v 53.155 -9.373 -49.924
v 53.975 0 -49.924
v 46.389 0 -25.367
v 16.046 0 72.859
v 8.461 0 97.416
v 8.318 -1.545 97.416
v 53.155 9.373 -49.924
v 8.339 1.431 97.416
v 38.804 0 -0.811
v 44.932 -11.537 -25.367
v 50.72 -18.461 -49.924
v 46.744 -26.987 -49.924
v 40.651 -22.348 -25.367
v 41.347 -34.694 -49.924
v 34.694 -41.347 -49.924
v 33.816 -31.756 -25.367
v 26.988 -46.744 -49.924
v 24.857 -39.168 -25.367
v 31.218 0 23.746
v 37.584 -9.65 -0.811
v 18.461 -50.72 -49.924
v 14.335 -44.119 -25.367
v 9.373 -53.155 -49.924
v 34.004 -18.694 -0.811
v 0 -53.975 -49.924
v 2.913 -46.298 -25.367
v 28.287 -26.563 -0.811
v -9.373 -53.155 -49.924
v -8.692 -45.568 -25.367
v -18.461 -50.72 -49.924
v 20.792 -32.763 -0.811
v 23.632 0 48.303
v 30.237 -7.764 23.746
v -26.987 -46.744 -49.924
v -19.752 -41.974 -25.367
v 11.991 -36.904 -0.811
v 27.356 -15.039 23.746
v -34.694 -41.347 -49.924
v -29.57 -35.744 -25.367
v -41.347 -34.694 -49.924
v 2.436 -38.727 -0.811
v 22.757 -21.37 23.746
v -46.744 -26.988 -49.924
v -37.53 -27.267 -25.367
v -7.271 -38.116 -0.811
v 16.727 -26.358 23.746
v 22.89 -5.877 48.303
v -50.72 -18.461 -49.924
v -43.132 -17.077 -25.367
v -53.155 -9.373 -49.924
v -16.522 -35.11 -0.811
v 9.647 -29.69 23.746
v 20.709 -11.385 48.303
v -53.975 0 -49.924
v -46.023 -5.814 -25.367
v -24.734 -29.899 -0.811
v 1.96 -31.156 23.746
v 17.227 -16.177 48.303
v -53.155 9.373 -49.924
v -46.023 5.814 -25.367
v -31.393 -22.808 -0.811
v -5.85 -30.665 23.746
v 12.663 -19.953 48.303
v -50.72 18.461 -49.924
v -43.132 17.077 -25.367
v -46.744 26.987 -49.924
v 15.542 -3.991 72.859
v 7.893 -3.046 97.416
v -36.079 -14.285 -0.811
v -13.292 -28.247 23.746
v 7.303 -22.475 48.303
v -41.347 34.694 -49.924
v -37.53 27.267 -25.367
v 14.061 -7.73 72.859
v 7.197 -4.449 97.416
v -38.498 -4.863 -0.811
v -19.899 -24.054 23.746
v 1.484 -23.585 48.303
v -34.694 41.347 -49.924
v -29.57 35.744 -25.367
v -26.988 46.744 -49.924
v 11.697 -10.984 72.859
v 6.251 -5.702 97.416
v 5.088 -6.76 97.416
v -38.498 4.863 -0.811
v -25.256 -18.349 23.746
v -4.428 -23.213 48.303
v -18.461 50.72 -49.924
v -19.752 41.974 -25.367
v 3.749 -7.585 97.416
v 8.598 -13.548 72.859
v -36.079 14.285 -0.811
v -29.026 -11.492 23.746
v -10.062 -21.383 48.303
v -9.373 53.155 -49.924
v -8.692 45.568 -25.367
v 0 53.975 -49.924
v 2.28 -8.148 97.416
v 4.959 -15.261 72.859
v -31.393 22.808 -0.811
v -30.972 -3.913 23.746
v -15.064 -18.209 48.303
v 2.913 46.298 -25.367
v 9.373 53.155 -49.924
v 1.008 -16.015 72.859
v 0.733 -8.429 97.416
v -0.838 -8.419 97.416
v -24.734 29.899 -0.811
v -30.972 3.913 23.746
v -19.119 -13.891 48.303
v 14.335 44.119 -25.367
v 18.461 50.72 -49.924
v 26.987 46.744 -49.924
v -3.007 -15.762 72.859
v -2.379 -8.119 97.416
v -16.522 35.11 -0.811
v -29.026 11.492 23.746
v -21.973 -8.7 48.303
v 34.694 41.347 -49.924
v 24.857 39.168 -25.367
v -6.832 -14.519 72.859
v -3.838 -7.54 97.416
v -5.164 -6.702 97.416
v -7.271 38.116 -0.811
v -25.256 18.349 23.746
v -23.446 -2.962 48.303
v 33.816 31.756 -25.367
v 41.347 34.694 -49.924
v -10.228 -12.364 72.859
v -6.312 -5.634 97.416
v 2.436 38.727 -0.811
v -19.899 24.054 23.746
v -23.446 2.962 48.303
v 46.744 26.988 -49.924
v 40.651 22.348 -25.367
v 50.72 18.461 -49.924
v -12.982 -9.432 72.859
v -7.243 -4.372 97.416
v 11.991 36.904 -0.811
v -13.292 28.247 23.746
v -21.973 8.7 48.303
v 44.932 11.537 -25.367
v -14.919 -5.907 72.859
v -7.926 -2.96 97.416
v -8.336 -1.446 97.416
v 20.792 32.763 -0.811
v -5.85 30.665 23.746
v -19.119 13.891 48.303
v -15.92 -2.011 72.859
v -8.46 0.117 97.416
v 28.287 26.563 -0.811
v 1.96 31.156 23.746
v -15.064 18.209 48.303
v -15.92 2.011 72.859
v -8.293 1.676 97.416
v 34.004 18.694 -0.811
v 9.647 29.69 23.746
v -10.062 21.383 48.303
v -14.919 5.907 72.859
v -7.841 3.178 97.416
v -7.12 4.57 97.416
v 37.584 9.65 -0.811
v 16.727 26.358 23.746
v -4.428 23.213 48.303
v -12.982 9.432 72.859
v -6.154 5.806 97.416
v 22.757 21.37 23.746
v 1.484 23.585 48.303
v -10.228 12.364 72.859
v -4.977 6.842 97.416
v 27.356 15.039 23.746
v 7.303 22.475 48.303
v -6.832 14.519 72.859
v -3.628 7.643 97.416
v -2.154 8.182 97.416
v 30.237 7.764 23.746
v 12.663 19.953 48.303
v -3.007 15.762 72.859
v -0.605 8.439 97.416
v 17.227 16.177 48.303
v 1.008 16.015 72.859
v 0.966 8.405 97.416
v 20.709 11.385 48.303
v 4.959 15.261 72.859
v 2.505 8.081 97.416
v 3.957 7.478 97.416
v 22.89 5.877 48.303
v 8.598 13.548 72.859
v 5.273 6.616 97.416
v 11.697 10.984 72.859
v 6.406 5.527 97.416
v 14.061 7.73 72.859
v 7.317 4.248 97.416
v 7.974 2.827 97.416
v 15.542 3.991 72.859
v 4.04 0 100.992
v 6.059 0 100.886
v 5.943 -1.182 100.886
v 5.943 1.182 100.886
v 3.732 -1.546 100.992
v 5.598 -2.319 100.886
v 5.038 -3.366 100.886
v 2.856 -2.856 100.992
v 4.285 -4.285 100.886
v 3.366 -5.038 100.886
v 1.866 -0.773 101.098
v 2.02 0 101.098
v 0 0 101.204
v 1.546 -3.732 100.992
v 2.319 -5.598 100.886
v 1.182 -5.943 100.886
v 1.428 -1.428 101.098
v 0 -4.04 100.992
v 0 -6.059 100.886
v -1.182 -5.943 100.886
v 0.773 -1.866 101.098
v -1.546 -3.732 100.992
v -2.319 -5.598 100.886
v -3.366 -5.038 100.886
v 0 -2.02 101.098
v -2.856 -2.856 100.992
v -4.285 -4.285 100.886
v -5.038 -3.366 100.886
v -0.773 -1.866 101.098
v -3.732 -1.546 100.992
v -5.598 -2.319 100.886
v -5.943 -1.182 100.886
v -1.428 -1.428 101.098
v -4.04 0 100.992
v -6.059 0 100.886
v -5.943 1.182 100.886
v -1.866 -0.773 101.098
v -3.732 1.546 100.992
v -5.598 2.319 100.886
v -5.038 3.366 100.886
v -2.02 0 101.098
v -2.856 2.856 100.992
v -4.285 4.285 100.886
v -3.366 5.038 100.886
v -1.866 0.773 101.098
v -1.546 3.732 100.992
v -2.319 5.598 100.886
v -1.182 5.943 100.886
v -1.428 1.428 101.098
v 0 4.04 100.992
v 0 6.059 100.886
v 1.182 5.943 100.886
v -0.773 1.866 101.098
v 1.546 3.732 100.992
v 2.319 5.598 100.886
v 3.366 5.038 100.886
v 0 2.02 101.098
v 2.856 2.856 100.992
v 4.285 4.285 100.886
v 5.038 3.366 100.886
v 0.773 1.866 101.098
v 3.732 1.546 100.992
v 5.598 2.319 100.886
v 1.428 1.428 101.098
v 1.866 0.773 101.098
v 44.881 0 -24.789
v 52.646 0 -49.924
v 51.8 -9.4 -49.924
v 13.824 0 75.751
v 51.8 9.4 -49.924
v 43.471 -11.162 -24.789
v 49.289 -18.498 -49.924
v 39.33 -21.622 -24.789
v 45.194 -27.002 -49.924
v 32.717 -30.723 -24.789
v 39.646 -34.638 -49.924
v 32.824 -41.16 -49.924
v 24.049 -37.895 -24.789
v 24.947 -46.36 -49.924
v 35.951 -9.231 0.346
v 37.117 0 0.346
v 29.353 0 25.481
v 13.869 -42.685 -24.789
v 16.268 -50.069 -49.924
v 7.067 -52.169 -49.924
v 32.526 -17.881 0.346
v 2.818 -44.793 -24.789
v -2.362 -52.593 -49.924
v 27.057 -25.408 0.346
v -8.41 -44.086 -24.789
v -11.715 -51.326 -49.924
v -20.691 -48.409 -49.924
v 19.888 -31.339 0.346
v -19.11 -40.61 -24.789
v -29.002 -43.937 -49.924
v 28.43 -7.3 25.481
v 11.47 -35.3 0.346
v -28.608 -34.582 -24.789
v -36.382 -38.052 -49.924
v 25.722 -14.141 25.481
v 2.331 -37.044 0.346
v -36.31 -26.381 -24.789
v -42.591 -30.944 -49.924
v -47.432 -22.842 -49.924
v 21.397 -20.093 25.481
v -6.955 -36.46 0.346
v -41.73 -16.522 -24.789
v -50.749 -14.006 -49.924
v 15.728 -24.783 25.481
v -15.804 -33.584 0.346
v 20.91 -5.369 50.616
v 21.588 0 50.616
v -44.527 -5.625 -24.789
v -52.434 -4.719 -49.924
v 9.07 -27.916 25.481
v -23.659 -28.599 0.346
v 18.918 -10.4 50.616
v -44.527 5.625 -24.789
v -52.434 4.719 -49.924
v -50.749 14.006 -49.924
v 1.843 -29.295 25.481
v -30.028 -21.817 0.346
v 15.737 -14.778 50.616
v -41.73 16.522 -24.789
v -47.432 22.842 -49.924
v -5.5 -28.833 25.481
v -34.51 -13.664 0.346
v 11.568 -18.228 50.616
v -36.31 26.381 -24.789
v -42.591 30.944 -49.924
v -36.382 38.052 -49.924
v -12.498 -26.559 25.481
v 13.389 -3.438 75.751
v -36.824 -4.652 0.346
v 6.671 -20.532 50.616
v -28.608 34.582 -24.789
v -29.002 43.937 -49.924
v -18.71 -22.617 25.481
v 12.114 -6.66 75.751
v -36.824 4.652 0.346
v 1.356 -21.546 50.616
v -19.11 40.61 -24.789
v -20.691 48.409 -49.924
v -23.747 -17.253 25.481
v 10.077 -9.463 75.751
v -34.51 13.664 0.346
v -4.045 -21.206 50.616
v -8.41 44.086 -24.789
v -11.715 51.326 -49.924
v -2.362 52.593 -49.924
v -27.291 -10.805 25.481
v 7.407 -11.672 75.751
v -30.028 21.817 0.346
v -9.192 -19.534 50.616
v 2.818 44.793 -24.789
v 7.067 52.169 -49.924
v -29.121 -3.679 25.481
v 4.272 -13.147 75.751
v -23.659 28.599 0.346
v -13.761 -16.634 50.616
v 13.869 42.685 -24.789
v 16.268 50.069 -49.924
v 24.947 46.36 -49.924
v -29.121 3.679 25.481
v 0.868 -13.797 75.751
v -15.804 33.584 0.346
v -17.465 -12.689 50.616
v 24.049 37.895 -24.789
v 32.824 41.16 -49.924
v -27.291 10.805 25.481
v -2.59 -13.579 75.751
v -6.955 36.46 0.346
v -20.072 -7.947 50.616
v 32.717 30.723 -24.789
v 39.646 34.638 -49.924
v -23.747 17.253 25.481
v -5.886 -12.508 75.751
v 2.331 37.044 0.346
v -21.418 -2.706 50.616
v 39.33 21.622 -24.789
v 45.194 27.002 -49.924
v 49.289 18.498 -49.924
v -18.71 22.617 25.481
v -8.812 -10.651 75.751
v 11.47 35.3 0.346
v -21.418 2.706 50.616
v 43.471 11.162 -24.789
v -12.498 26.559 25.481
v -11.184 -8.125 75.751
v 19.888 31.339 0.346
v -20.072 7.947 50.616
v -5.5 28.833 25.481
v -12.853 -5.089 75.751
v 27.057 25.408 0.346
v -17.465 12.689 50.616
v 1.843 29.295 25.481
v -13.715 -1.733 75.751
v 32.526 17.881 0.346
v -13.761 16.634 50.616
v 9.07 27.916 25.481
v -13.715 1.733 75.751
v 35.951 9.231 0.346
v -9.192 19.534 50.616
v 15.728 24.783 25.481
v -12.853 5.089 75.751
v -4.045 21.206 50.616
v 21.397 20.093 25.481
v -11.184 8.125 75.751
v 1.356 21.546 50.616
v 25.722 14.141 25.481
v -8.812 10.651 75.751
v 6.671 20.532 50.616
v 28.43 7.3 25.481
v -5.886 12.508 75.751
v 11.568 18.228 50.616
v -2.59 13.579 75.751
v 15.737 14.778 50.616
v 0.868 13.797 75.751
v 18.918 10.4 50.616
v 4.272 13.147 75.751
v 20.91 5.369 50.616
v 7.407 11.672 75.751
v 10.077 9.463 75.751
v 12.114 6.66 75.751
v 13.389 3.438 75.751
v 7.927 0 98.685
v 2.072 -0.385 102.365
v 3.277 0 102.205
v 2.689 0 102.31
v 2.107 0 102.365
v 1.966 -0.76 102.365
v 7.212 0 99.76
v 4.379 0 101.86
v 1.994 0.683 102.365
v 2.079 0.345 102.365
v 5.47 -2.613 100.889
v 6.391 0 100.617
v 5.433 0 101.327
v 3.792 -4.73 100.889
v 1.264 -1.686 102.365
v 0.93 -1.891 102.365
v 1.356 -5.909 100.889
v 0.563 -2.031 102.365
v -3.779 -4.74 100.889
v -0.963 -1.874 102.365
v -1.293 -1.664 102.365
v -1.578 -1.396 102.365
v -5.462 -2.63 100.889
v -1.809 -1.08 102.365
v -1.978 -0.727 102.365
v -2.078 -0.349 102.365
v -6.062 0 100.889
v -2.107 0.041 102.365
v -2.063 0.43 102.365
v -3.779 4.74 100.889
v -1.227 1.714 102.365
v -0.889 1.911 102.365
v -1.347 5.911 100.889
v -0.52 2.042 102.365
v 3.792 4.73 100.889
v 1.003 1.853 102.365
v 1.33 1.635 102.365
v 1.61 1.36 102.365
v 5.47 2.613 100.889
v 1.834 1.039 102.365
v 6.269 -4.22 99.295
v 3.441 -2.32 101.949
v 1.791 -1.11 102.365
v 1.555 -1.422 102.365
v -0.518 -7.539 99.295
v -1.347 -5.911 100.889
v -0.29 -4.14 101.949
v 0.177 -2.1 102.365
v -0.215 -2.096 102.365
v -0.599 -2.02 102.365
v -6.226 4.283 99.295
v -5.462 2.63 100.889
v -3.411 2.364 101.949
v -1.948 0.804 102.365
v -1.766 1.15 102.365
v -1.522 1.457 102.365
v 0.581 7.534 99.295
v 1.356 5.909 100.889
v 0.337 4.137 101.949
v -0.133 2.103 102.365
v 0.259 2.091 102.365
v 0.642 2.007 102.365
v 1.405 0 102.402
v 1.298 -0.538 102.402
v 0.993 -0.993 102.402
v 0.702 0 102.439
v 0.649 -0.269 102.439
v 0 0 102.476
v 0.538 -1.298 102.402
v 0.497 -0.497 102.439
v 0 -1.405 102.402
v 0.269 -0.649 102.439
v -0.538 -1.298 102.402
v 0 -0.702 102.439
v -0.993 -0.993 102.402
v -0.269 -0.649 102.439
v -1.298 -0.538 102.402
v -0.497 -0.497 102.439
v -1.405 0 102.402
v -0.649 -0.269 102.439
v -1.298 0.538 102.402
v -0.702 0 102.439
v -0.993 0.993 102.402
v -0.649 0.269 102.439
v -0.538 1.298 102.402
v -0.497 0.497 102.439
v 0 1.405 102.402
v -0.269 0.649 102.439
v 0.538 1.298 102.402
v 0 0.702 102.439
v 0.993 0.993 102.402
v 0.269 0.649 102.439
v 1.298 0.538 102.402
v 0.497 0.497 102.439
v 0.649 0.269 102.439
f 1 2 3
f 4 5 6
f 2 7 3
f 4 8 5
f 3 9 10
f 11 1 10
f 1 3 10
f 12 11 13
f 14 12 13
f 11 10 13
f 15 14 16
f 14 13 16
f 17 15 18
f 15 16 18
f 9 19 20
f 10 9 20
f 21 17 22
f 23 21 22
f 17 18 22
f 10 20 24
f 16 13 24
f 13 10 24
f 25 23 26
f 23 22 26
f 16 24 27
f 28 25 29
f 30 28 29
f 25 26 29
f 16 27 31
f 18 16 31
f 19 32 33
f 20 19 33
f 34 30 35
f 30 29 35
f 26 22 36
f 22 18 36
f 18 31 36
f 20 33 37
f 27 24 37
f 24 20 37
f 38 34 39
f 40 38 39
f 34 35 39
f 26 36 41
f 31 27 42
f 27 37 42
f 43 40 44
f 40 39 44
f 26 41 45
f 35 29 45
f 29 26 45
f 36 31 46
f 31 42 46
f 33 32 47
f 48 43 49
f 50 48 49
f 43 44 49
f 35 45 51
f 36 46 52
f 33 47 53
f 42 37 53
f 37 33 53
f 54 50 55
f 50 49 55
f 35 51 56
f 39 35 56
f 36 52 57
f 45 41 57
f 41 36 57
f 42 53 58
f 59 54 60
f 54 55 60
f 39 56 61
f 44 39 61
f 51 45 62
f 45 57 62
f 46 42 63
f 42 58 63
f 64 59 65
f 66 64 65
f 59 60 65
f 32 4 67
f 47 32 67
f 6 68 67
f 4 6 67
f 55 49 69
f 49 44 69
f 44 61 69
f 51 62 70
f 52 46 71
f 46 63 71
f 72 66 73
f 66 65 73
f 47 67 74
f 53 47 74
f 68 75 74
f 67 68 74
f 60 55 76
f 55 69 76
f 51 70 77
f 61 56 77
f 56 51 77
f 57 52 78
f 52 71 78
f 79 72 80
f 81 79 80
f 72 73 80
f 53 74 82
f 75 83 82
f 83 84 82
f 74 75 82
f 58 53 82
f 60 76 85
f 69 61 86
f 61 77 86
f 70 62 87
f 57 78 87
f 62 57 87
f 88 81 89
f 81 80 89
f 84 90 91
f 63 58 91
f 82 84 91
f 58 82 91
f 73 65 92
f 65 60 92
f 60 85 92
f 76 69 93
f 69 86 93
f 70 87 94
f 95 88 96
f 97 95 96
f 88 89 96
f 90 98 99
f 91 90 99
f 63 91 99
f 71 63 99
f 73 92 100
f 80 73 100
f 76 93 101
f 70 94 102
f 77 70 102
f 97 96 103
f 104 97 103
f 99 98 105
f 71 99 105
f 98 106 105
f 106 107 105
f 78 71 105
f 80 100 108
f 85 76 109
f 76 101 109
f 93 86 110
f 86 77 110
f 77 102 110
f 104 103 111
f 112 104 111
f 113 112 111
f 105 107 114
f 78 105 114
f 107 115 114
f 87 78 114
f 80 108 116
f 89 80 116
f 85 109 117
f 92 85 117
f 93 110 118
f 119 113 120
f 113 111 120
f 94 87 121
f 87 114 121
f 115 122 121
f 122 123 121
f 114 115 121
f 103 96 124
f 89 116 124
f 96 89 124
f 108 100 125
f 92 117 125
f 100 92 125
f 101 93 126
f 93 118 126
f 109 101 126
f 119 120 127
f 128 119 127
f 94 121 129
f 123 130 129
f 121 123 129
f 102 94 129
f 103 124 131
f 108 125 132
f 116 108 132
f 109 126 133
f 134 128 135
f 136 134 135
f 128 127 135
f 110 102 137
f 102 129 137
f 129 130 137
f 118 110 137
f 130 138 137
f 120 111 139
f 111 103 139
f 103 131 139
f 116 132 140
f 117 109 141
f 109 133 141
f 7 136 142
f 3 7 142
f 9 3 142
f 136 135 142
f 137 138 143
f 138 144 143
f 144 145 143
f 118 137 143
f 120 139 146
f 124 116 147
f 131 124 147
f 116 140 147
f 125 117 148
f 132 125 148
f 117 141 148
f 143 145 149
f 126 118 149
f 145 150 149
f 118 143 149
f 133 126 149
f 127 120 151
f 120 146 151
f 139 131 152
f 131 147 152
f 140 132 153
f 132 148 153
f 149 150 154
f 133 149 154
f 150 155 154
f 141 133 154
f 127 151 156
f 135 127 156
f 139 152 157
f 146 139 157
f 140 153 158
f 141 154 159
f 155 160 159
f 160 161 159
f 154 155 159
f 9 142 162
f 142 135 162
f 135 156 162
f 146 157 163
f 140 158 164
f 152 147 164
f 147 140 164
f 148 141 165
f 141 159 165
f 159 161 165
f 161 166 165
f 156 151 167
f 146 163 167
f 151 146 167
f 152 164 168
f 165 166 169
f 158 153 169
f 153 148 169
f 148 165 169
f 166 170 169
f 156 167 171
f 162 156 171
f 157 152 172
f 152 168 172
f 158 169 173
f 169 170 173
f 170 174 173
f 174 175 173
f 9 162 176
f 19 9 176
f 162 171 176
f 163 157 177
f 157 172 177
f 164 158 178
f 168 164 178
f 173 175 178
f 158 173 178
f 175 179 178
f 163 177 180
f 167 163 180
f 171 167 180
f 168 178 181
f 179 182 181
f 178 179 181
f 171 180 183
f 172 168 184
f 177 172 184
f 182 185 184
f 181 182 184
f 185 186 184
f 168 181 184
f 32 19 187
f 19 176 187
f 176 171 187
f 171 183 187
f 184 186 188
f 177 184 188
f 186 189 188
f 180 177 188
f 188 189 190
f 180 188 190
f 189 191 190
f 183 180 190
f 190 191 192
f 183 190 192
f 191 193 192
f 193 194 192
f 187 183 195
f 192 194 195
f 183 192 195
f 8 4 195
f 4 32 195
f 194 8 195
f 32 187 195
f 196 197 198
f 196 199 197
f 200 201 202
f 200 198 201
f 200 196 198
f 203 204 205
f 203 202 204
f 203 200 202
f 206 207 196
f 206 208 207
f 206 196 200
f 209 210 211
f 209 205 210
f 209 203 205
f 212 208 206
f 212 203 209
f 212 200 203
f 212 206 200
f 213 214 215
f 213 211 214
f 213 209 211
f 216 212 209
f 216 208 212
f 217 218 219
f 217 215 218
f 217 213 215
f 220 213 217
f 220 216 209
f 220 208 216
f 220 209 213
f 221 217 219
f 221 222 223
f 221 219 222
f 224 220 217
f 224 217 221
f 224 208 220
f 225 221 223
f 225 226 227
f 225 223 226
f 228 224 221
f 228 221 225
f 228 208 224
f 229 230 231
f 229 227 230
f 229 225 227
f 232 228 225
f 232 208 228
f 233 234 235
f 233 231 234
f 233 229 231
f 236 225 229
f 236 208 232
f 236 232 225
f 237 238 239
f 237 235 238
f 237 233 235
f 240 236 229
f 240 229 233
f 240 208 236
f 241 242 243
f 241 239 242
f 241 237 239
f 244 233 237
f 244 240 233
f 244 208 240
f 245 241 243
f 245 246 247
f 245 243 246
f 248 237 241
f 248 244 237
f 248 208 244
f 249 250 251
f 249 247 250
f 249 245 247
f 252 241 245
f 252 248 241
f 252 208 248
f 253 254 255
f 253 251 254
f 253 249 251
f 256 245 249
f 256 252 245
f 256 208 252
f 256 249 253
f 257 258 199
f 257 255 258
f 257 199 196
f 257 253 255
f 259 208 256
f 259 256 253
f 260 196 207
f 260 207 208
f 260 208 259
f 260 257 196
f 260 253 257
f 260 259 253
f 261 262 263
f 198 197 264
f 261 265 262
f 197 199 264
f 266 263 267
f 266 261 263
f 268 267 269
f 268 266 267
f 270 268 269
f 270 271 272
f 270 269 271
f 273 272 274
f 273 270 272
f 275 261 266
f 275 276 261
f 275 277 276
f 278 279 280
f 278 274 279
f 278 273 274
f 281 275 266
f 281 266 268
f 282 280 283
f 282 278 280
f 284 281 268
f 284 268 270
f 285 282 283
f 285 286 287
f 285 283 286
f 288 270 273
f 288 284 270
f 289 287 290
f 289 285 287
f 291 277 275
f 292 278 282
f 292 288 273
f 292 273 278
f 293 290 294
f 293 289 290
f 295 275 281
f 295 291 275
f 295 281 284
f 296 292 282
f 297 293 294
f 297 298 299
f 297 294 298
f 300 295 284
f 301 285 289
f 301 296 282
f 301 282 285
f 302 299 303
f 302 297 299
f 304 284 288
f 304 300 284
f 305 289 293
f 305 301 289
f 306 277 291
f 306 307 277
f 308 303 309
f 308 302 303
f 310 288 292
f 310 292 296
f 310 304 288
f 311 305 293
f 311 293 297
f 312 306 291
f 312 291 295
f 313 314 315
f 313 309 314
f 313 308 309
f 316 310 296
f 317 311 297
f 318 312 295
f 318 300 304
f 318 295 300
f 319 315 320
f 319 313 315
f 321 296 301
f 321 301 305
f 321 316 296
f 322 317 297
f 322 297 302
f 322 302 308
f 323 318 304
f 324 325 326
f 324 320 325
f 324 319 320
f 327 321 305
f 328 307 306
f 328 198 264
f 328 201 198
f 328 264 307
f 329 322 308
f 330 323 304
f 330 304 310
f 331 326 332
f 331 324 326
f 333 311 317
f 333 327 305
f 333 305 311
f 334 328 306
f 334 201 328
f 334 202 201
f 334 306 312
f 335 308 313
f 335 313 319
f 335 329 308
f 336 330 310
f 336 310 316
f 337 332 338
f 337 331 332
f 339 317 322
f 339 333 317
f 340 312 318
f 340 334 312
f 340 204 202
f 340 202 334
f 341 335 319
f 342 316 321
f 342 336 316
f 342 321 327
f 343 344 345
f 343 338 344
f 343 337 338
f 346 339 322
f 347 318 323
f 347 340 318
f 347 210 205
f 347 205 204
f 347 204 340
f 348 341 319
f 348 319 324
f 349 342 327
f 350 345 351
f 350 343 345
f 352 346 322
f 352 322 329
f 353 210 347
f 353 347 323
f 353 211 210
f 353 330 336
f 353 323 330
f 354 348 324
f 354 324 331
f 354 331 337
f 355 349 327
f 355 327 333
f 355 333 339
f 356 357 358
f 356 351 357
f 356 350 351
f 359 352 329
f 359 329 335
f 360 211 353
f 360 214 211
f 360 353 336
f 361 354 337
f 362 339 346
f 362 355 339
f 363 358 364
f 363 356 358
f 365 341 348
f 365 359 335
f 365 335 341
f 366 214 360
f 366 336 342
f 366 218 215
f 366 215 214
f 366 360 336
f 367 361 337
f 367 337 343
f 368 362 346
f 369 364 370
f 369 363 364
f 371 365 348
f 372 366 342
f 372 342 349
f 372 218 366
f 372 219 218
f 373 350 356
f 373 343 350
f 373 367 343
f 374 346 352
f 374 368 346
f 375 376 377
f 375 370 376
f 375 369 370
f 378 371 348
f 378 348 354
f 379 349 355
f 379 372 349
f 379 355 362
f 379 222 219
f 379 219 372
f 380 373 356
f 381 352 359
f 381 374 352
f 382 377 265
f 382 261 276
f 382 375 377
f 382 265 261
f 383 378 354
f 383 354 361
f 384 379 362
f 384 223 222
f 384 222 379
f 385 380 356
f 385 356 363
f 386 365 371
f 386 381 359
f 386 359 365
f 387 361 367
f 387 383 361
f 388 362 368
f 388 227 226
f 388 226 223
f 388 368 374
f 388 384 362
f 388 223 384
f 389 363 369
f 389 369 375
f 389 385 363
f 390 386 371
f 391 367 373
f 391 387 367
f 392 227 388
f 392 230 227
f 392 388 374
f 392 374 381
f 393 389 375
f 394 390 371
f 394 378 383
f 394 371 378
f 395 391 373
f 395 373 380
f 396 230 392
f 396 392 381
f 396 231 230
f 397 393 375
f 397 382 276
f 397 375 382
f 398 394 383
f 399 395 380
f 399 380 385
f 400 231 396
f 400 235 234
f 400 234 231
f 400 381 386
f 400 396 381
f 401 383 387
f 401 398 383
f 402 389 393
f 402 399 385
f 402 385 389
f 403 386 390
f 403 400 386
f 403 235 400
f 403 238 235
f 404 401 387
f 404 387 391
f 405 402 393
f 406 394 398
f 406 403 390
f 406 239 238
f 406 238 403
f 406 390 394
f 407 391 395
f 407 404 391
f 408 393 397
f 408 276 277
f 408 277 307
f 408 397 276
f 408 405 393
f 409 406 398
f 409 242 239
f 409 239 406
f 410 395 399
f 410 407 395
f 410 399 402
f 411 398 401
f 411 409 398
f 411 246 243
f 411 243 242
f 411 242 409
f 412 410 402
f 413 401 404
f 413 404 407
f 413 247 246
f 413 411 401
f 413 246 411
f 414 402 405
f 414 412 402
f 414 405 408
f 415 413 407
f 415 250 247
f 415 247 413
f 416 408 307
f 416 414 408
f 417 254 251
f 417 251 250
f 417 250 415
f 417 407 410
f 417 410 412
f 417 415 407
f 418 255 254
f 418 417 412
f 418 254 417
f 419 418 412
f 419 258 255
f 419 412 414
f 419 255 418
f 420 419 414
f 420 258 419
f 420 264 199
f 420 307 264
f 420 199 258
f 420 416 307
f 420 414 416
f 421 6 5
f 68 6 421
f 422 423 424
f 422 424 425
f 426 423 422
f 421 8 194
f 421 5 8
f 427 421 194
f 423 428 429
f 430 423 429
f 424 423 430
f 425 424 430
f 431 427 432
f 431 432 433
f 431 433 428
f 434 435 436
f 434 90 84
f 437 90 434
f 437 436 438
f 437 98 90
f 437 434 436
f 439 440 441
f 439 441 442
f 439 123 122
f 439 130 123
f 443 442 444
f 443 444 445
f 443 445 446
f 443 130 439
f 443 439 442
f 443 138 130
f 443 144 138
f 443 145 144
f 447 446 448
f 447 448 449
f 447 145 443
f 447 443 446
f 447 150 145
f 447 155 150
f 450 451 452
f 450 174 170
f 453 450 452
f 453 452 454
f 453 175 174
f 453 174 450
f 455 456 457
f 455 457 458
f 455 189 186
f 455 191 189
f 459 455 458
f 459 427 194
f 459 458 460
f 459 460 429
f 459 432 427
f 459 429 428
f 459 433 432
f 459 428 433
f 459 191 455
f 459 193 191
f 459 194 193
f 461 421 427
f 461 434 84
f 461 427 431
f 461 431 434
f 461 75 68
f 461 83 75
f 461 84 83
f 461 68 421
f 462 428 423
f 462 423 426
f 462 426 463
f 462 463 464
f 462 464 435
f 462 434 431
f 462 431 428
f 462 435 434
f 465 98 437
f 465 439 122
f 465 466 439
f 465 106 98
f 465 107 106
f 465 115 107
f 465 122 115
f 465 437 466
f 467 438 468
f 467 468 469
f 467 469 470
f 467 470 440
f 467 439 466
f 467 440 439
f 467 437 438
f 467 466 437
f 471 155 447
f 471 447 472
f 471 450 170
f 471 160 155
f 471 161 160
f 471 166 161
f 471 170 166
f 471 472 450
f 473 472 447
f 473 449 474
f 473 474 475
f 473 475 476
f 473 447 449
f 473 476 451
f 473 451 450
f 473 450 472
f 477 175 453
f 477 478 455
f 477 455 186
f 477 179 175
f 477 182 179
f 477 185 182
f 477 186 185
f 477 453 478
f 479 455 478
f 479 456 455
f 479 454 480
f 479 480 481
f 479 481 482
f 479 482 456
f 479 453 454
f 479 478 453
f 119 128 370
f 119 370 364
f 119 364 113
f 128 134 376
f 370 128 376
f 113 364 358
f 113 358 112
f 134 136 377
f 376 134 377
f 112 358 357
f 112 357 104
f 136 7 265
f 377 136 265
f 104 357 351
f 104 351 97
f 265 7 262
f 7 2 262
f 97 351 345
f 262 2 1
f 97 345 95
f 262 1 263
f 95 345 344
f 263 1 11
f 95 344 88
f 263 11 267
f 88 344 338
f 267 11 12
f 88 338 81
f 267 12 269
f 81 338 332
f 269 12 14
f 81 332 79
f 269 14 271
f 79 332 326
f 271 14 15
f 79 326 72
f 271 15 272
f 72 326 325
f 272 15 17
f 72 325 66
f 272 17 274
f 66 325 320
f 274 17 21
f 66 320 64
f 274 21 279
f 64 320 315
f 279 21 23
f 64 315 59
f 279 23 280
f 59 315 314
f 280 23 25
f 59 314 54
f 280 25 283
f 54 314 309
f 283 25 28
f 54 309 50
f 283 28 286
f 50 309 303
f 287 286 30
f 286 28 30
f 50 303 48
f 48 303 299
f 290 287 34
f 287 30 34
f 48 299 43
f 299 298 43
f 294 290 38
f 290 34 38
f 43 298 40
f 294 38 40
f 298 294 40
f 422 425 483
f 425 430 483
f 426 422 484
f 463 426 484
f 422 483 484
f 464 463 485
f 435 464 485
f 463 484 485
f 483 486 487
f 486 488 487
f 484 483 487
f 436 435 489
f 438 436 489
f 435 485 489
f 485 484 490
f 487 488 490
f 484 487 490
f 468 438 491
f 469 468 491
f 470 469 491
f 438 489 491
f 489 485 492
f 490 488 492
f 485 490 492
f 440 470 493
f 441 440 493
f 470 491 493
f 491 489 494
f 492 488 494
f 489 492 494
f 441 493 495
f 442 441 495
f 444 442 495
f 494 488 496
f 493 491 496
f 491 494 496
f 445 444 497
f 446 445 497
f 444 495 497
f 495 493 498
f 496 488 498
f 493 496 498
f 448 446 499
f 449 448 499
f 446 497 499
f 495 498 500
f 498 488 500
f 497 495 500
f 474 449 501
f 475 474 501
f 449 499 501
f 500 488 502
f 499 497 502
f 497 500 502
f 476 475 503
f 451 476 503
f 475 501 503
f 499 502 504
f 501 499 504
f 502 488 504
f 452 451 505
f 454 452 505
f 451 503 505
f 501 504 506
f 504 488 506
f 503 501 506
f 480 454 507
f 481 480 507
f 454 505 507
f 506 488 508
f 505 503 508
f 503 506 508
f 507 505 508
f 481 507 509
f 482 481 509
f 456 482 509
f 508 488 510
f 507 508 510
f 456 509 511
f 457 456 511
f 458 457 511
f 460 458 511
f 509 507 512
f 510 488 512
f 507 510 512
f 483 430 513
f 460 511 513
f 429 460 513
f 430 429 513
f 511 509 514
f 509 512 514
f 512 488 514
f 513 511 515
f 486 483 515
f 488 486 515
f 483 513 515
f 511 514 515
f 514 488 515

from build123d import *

# Parameters (mm, degrees)
F2_T = -1.27
F3_R = 7.0358


with BuildPart() as f1:
    # F0 (on Front) → F1 (revolve)
    with BuildSketch(Plane.XZ):
        Polygon((0, 102.476016), (0, -49.923984), (53.975, -49.923984), (7.011191, 102.107614), align=None)
    revolve(axis=Axis((0, 0, 26.276016), (0, 0, -1)))

    # F2
    f2_openings = [f1.faces().sort_by_distance(p)[0] for p in [
        (0, 0, -49.923984),
    ]]
    offset(amount=F2_T, openings=f2_openings)

    # F3
    f3_edges = [f1.edges().sort_by_distance(p)[0] for p in [
        (-7.011191, 0, 102.107614),
    ]]
    fillet(f3_edges, radius=F3_R)


solid = f1.part
